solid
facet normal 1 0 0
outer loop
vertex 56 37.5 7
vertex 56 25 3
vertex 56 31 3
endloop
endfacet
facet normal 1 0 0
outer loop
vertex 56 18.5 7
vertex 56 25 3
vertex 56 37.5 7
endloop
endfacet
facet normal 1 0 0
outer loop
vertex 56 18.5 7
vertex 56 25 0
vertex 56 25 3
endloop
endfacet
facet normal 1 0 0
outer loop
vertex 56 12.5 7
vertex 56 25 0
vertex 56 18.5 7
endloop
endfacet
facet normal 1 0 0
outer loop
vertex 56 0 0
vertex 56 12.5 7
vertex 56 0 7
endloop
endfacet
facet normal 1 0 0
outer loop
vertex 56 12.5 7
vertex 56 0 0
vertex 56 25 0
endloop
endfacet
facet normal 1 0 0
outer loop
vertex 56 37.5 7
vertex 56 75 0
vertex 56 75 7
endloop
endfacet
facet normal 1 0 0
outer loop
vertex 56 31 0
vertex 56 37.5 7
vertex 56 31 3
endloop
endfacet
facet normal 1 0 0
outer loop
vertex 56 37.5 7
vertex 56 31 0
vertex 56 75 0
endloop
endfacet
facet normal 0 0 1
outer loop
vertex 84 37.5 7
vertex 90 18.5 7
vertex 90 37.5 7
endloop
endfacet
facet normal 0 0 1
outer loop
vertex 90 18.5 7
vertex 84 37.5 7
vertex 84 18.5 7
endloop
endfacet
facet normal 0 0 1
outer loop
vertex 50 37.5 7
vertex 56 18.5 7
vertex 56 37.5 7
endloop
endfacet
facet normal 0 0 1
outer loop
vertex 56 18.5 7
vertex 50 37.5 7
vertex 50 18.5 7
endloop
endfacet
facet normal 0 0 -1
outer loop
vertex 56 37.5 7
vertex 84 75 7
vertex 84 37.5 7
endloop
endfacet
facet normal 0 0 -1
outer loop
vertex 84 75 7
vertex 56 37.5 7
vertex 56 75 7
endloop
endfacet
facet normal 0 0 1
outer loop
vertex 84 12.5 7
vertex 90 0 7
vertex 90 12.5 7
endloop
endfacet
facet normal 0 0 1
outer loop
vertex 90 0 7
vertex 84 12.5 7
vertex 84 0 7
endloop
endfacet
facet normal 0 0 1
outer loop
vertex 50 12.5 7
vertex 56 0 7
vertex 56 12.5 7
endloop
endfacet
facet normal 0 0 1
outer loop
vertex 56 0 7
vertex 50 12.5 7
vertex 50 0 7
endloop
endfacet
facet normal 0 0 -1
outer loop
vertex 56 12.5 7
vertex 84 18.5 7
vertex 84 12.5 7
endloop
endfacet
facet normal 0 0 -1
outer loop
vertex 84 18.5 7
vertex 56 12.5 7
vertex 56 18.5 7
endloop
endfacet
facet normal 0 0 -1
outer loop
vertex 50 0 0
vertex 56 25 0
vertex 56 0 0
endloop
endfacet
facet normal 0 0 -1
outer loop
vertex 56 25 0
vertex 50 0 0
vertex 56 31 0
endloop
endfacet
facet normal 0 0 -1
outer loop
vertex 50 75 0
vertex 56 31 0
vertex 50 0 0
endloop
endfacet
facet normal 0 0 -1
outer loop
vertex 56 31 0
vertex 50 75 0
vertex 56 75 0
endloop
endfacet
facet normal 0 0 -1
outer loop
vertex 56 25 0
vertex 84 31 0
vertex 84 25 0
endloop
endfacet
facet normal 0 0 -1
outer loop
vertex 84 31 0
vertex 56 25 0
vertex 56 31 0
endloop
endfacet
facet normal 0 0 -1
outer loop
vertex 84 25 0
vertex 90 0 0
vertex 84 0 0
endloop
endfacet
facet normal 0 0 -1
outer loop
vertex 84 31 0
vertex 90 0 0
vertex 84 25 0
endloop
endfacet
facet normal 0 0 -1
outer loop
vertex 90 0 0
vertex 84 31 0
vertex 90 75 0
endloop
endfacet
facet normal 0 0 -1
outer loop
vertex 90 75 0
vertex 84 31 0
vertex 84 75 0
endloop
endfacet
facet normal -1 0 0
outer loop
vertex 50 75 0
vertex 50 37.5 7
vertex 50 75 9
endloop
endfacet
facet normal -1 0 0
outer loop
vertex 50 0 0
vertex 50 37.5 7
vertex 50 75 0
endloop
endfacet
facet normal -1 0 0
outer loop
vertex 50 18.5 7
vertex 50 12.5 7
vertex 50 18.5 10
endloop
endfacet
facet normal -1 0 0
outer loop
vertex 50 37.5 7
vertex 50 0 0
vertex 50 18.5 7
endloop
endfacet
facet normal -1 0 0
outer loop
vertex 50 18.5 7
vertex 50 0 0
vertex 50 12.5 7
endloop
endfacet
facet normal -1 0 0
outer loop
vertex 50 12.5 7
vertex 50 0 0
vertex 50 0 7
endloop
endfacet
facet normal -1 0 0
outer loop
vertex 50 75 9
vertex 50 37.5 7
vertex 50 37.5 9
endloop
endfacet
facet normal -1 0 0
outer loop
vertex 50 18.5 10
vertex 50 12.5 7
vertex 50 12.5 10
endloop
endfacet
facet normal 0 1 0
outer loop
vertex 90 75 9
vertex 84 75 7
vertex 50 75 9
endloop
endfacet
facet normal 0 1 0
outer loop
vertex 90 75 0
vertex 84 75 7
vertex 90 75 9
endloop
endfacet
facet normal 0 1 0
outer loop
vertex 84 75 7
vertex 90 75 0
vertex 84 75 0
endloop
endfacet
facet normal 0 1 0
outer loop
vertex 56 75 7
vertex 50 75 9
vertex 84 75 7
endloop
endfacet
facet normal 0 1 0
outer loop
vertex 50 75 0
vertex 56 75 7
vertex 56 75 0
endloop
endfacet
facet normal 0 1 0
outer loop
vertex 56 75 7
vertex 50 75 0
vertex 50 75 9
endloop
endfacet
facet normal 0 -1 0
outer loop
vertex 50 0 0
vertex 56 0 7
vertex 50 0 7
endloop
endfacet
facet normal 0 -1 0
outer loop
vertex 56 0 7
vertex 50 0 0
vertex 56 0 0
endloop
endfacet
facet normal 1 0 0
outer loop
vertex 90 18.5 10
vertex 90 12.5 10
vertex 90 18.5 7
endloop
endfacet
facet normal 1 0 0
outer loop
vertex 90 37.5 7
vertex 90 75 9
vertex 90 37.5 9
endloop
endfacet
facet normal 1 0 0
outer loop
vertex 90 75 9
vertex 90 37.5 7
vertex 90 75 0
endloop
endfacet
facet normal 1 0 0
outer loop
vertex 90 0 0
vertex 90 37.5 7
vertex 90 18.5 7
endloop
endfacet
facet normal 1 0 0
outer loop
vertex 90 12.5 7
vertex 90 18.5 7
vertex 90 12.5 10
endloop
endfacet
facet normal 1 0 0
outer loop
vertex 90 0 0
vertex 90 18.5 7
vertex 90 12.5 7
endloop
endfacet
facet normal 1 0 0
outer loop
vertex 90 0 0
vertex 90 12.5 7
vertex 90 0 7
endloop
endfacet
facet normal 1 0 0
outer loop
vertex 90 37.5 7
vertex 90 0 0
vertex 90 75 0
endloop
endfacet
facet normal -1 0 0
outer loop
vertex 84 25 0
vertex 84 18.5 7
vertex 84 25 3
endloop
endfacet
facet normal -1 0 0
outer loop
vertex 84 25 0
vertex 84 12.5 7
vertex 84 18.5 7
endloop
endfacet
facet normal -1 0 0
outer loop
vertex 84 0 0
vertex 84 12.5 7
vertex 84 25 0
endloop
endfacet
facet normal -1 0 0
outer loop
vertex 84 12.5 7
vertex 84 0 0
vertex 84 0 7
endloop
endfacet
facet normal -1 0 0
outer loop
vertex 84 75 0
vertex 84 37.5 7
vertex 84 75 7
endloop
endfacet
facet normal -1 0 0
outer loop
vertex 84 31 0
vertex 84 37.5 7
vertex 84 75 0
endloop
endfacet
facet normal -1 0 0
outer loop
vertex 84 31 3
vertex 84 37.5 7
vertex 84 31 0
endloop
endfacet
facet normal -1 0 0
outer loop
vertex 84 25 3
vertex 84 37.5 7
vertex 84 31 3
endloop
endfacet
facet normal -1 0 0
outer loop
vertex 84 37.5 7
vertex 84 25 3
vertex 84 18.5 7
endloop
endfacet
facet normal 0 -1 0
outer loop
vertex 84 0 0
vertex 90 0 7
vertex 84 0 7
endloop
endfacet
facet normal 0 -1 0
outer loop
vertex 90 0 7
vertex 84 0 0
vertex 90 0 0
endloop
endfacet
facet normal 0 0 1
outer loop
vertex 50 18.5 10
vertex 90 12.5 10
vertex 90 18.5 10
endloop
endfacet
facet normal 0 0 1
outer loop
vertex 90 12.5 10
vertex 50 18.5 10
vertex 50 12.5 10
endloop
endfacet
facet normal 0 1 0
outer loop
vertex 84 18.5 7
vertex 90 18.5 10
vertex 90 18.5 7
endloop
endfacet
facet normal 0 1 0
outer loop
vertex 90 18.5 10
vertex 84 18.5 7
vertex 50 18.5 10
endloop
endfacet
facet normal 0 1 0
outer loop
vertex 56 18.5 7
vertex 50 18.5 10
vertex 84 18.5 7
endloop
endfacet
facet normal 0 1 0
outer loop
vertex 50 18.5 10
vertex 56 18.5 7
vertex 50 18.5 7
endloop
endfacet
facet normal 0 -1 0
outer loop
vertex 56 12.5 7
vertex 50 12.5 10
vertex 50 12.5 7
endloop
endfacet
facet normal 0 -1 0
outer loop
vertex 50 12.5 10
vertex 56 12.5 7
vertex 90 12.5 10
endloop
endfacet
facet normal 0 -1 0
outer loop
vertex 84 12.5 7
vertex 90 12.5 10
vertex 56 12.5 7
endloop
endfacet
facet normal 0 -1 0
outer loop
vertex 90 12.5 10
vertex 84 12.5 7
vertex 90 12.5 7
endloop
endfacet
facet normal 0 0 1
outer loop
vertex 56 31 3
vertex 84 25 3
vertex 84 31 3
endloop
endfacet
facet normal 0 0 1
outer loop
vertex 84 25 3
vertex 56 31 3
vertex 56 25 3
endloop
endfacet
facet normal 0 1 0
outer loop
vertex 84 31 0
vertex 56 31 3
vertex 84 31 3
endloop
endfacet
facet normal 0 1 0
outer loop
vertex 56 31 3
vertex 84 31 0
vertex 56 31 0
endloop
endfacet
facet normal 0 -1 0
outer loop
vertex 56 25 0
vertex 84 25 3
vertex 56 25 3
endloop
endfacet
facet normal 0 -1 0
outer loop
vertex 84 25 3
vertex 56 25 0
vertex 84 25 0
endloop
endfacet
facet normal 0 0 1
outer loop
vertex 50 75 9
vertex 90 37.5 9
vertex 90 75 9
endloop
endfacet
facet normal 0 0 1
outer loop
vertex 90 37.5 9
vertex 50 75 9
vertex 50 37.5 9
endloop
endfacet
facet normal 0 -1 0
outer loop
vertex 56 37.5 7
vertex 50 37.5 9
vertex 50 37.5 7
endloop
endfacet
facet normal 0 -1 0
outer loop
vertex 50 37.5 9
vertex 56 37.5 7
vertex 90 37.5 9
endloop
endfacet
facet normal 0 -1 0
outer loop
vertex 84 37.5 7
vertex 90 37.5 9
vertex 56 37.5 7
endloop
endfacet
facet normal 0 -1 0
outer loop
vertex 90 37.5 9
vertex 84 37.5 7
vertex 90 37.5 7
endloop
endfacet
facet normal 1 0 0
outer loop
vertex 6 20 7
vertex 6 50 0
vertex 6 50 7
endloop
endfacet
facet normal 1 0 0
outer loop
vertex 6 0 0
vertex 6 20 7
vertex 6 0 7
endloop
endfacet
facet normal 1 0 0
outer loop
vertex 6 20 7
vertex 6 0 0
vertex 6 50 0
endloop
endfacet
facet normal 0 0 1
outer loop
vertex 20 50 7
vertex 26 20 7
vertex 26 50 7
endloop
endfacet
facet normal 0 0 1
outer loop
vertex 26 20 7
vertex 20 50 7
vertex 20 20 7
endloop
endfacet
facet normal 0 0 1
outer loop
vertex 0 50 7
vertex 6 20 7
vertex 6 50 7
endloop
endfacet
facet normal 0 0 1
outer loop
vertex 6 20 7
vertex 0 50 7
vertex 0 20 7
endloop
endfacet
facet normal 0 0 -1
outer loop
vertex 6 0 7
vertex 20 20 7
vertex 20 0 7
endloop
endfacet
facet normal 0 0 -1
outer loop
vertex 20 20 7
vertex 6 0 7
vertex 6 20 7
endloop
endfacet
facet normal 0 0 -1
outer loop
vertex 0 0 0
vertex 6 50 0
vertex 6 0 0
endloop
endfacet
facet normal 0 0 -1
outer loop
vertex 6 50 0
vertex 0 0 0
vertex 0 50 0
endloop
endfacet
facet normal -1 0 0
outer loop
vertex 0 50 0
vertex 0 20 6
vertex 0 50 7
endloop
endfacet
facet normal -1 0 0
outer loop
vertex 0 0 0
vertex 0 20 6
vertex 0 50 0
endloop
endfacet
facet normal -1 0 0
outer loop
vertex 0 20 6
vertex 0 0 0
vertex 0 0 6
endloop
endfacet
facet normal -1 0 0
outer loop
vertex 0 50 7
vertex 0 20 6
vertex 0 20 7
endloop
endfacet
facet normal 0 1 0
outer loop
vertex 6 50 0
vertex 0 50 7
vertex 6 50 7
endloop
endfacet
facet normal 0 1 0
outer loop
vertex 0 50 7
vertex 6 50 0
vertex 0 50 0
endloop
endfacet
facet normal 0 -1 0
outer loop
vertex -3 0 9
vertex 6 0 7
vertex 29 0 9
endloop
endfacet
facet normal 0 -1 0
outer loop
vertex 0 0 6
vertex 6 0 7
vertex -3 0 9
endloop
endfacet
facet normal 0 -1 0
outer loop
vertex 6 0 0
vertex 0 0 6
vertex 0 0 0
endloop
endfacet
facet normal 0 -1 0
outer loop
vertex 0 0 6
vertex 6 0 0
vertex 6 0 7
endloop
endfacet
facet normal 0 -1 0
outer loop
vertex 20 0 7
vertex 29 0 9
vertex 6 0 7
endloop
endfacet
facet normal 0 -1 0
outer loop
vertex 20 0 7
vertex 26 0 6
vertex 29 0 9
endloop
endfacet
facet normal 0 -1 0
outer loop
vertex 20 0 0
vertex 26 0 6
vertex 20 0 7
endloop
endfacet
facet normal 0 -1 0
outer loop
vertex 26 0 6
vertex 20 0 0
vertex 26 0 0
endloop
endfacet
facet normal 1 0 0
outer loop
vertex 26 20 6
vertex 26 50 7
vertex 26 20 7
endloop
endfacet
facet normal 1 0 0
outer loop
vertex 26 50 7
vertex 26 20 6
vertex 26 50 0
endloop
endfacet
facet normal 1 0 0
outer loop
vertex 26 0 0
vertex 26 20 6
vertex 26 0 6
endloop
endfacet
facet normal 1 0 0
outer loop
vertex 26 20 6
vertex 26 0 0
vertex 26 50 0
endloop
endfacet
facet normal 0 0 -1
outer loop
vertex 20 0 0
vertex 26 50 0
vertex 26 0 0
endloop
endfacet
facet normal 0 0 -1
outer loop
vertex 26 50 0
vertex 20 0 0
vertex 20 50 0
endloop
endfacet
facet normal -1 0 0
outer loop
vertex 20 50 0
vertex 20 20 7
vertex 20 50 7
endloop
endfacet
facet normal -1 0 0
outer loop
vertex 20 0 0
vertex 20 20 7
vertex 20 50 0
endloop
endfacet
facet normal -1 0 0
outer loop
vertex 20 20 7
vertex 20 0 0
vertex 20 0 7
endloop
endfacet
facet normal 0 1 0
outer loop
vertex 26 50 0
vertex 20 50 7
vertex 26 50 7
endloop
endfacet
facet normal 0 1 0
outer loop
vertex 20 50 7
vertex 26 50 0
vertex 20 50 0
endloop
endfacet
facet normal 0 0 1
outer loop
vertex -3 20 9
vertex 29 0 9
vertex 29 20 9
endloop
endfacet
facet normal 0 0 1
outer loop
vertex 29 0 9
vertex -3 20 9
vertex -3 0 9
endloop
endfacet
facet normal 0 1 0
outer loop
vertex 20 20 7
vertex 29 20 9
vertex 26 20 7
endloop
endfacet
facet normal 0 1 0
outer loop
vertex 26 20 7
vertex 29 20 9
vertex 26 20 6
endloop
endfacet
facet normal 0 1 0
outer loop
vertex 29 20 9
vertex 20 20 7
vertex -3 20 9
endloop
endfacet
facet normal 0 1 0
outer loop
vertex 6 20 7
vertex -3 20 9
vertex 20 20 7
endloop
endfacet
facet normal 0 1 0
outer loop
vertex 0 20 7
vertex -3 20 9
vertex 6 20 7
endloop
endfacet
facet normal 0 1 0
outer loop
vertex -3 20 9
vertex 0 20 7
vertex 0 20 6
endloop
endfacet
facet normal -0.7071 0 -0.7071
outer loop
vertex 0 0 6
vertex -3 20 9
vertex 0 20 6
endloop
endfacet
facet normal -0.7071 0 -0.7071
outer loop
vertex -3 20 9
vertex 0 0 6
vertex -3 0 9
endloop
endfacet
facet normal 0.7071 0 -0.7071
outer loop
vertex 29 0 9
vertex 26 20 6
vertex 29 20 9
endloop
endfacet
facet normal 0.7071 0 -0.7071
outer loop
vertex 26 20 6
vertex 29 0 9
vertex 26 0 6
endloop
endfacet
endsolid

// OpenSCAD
//distance between legs
dl = 20;

//leg width
lw = 6;

//leg thickness
lth = 7;

//leg length
ll = 50;

//give between legs and legs

give = 1;



//legs
cube([lw, ll, lth]);
translate([dl,0,0])
cube([lw, ll, lth]);


//seat
translate([0,0,lth])
cube([dl+lw, 2*ll/5, 2]);


translate([-lw/2,0,lth+2])
rotate([-90,0,0])
linear_extrude(height=2*ll/5)
polygon(points=[[0,0],[lw,0],[lw,lw]]);



translate([lw/2+dl,0,lth+2-lw])
rotate([-90,-90,0])
linear_extrude(height=2*ll/5)
polygon(points=[[0,0],[lw,0],[lw,lw]]);



//back support
translate([50,0,0]){

//legs
cube([lw, ll*1.5, lth]);
translate([dl+lw*2+give*2,0,0])
cube([lw, ll*1.5, lth]);


//bars
translate([0,ll/4,lth])
cube([dl+lw*2+give*2+lw, lw, 3]);


translate([0,ll/2,0])
cube([dl+lw*2+give*2+lw, lw, 3]);

//seat
translate([0,ll*3/4,lth])
{
cube([dl+lw*3+give*2, ll*3/4, 2]);

}




}
